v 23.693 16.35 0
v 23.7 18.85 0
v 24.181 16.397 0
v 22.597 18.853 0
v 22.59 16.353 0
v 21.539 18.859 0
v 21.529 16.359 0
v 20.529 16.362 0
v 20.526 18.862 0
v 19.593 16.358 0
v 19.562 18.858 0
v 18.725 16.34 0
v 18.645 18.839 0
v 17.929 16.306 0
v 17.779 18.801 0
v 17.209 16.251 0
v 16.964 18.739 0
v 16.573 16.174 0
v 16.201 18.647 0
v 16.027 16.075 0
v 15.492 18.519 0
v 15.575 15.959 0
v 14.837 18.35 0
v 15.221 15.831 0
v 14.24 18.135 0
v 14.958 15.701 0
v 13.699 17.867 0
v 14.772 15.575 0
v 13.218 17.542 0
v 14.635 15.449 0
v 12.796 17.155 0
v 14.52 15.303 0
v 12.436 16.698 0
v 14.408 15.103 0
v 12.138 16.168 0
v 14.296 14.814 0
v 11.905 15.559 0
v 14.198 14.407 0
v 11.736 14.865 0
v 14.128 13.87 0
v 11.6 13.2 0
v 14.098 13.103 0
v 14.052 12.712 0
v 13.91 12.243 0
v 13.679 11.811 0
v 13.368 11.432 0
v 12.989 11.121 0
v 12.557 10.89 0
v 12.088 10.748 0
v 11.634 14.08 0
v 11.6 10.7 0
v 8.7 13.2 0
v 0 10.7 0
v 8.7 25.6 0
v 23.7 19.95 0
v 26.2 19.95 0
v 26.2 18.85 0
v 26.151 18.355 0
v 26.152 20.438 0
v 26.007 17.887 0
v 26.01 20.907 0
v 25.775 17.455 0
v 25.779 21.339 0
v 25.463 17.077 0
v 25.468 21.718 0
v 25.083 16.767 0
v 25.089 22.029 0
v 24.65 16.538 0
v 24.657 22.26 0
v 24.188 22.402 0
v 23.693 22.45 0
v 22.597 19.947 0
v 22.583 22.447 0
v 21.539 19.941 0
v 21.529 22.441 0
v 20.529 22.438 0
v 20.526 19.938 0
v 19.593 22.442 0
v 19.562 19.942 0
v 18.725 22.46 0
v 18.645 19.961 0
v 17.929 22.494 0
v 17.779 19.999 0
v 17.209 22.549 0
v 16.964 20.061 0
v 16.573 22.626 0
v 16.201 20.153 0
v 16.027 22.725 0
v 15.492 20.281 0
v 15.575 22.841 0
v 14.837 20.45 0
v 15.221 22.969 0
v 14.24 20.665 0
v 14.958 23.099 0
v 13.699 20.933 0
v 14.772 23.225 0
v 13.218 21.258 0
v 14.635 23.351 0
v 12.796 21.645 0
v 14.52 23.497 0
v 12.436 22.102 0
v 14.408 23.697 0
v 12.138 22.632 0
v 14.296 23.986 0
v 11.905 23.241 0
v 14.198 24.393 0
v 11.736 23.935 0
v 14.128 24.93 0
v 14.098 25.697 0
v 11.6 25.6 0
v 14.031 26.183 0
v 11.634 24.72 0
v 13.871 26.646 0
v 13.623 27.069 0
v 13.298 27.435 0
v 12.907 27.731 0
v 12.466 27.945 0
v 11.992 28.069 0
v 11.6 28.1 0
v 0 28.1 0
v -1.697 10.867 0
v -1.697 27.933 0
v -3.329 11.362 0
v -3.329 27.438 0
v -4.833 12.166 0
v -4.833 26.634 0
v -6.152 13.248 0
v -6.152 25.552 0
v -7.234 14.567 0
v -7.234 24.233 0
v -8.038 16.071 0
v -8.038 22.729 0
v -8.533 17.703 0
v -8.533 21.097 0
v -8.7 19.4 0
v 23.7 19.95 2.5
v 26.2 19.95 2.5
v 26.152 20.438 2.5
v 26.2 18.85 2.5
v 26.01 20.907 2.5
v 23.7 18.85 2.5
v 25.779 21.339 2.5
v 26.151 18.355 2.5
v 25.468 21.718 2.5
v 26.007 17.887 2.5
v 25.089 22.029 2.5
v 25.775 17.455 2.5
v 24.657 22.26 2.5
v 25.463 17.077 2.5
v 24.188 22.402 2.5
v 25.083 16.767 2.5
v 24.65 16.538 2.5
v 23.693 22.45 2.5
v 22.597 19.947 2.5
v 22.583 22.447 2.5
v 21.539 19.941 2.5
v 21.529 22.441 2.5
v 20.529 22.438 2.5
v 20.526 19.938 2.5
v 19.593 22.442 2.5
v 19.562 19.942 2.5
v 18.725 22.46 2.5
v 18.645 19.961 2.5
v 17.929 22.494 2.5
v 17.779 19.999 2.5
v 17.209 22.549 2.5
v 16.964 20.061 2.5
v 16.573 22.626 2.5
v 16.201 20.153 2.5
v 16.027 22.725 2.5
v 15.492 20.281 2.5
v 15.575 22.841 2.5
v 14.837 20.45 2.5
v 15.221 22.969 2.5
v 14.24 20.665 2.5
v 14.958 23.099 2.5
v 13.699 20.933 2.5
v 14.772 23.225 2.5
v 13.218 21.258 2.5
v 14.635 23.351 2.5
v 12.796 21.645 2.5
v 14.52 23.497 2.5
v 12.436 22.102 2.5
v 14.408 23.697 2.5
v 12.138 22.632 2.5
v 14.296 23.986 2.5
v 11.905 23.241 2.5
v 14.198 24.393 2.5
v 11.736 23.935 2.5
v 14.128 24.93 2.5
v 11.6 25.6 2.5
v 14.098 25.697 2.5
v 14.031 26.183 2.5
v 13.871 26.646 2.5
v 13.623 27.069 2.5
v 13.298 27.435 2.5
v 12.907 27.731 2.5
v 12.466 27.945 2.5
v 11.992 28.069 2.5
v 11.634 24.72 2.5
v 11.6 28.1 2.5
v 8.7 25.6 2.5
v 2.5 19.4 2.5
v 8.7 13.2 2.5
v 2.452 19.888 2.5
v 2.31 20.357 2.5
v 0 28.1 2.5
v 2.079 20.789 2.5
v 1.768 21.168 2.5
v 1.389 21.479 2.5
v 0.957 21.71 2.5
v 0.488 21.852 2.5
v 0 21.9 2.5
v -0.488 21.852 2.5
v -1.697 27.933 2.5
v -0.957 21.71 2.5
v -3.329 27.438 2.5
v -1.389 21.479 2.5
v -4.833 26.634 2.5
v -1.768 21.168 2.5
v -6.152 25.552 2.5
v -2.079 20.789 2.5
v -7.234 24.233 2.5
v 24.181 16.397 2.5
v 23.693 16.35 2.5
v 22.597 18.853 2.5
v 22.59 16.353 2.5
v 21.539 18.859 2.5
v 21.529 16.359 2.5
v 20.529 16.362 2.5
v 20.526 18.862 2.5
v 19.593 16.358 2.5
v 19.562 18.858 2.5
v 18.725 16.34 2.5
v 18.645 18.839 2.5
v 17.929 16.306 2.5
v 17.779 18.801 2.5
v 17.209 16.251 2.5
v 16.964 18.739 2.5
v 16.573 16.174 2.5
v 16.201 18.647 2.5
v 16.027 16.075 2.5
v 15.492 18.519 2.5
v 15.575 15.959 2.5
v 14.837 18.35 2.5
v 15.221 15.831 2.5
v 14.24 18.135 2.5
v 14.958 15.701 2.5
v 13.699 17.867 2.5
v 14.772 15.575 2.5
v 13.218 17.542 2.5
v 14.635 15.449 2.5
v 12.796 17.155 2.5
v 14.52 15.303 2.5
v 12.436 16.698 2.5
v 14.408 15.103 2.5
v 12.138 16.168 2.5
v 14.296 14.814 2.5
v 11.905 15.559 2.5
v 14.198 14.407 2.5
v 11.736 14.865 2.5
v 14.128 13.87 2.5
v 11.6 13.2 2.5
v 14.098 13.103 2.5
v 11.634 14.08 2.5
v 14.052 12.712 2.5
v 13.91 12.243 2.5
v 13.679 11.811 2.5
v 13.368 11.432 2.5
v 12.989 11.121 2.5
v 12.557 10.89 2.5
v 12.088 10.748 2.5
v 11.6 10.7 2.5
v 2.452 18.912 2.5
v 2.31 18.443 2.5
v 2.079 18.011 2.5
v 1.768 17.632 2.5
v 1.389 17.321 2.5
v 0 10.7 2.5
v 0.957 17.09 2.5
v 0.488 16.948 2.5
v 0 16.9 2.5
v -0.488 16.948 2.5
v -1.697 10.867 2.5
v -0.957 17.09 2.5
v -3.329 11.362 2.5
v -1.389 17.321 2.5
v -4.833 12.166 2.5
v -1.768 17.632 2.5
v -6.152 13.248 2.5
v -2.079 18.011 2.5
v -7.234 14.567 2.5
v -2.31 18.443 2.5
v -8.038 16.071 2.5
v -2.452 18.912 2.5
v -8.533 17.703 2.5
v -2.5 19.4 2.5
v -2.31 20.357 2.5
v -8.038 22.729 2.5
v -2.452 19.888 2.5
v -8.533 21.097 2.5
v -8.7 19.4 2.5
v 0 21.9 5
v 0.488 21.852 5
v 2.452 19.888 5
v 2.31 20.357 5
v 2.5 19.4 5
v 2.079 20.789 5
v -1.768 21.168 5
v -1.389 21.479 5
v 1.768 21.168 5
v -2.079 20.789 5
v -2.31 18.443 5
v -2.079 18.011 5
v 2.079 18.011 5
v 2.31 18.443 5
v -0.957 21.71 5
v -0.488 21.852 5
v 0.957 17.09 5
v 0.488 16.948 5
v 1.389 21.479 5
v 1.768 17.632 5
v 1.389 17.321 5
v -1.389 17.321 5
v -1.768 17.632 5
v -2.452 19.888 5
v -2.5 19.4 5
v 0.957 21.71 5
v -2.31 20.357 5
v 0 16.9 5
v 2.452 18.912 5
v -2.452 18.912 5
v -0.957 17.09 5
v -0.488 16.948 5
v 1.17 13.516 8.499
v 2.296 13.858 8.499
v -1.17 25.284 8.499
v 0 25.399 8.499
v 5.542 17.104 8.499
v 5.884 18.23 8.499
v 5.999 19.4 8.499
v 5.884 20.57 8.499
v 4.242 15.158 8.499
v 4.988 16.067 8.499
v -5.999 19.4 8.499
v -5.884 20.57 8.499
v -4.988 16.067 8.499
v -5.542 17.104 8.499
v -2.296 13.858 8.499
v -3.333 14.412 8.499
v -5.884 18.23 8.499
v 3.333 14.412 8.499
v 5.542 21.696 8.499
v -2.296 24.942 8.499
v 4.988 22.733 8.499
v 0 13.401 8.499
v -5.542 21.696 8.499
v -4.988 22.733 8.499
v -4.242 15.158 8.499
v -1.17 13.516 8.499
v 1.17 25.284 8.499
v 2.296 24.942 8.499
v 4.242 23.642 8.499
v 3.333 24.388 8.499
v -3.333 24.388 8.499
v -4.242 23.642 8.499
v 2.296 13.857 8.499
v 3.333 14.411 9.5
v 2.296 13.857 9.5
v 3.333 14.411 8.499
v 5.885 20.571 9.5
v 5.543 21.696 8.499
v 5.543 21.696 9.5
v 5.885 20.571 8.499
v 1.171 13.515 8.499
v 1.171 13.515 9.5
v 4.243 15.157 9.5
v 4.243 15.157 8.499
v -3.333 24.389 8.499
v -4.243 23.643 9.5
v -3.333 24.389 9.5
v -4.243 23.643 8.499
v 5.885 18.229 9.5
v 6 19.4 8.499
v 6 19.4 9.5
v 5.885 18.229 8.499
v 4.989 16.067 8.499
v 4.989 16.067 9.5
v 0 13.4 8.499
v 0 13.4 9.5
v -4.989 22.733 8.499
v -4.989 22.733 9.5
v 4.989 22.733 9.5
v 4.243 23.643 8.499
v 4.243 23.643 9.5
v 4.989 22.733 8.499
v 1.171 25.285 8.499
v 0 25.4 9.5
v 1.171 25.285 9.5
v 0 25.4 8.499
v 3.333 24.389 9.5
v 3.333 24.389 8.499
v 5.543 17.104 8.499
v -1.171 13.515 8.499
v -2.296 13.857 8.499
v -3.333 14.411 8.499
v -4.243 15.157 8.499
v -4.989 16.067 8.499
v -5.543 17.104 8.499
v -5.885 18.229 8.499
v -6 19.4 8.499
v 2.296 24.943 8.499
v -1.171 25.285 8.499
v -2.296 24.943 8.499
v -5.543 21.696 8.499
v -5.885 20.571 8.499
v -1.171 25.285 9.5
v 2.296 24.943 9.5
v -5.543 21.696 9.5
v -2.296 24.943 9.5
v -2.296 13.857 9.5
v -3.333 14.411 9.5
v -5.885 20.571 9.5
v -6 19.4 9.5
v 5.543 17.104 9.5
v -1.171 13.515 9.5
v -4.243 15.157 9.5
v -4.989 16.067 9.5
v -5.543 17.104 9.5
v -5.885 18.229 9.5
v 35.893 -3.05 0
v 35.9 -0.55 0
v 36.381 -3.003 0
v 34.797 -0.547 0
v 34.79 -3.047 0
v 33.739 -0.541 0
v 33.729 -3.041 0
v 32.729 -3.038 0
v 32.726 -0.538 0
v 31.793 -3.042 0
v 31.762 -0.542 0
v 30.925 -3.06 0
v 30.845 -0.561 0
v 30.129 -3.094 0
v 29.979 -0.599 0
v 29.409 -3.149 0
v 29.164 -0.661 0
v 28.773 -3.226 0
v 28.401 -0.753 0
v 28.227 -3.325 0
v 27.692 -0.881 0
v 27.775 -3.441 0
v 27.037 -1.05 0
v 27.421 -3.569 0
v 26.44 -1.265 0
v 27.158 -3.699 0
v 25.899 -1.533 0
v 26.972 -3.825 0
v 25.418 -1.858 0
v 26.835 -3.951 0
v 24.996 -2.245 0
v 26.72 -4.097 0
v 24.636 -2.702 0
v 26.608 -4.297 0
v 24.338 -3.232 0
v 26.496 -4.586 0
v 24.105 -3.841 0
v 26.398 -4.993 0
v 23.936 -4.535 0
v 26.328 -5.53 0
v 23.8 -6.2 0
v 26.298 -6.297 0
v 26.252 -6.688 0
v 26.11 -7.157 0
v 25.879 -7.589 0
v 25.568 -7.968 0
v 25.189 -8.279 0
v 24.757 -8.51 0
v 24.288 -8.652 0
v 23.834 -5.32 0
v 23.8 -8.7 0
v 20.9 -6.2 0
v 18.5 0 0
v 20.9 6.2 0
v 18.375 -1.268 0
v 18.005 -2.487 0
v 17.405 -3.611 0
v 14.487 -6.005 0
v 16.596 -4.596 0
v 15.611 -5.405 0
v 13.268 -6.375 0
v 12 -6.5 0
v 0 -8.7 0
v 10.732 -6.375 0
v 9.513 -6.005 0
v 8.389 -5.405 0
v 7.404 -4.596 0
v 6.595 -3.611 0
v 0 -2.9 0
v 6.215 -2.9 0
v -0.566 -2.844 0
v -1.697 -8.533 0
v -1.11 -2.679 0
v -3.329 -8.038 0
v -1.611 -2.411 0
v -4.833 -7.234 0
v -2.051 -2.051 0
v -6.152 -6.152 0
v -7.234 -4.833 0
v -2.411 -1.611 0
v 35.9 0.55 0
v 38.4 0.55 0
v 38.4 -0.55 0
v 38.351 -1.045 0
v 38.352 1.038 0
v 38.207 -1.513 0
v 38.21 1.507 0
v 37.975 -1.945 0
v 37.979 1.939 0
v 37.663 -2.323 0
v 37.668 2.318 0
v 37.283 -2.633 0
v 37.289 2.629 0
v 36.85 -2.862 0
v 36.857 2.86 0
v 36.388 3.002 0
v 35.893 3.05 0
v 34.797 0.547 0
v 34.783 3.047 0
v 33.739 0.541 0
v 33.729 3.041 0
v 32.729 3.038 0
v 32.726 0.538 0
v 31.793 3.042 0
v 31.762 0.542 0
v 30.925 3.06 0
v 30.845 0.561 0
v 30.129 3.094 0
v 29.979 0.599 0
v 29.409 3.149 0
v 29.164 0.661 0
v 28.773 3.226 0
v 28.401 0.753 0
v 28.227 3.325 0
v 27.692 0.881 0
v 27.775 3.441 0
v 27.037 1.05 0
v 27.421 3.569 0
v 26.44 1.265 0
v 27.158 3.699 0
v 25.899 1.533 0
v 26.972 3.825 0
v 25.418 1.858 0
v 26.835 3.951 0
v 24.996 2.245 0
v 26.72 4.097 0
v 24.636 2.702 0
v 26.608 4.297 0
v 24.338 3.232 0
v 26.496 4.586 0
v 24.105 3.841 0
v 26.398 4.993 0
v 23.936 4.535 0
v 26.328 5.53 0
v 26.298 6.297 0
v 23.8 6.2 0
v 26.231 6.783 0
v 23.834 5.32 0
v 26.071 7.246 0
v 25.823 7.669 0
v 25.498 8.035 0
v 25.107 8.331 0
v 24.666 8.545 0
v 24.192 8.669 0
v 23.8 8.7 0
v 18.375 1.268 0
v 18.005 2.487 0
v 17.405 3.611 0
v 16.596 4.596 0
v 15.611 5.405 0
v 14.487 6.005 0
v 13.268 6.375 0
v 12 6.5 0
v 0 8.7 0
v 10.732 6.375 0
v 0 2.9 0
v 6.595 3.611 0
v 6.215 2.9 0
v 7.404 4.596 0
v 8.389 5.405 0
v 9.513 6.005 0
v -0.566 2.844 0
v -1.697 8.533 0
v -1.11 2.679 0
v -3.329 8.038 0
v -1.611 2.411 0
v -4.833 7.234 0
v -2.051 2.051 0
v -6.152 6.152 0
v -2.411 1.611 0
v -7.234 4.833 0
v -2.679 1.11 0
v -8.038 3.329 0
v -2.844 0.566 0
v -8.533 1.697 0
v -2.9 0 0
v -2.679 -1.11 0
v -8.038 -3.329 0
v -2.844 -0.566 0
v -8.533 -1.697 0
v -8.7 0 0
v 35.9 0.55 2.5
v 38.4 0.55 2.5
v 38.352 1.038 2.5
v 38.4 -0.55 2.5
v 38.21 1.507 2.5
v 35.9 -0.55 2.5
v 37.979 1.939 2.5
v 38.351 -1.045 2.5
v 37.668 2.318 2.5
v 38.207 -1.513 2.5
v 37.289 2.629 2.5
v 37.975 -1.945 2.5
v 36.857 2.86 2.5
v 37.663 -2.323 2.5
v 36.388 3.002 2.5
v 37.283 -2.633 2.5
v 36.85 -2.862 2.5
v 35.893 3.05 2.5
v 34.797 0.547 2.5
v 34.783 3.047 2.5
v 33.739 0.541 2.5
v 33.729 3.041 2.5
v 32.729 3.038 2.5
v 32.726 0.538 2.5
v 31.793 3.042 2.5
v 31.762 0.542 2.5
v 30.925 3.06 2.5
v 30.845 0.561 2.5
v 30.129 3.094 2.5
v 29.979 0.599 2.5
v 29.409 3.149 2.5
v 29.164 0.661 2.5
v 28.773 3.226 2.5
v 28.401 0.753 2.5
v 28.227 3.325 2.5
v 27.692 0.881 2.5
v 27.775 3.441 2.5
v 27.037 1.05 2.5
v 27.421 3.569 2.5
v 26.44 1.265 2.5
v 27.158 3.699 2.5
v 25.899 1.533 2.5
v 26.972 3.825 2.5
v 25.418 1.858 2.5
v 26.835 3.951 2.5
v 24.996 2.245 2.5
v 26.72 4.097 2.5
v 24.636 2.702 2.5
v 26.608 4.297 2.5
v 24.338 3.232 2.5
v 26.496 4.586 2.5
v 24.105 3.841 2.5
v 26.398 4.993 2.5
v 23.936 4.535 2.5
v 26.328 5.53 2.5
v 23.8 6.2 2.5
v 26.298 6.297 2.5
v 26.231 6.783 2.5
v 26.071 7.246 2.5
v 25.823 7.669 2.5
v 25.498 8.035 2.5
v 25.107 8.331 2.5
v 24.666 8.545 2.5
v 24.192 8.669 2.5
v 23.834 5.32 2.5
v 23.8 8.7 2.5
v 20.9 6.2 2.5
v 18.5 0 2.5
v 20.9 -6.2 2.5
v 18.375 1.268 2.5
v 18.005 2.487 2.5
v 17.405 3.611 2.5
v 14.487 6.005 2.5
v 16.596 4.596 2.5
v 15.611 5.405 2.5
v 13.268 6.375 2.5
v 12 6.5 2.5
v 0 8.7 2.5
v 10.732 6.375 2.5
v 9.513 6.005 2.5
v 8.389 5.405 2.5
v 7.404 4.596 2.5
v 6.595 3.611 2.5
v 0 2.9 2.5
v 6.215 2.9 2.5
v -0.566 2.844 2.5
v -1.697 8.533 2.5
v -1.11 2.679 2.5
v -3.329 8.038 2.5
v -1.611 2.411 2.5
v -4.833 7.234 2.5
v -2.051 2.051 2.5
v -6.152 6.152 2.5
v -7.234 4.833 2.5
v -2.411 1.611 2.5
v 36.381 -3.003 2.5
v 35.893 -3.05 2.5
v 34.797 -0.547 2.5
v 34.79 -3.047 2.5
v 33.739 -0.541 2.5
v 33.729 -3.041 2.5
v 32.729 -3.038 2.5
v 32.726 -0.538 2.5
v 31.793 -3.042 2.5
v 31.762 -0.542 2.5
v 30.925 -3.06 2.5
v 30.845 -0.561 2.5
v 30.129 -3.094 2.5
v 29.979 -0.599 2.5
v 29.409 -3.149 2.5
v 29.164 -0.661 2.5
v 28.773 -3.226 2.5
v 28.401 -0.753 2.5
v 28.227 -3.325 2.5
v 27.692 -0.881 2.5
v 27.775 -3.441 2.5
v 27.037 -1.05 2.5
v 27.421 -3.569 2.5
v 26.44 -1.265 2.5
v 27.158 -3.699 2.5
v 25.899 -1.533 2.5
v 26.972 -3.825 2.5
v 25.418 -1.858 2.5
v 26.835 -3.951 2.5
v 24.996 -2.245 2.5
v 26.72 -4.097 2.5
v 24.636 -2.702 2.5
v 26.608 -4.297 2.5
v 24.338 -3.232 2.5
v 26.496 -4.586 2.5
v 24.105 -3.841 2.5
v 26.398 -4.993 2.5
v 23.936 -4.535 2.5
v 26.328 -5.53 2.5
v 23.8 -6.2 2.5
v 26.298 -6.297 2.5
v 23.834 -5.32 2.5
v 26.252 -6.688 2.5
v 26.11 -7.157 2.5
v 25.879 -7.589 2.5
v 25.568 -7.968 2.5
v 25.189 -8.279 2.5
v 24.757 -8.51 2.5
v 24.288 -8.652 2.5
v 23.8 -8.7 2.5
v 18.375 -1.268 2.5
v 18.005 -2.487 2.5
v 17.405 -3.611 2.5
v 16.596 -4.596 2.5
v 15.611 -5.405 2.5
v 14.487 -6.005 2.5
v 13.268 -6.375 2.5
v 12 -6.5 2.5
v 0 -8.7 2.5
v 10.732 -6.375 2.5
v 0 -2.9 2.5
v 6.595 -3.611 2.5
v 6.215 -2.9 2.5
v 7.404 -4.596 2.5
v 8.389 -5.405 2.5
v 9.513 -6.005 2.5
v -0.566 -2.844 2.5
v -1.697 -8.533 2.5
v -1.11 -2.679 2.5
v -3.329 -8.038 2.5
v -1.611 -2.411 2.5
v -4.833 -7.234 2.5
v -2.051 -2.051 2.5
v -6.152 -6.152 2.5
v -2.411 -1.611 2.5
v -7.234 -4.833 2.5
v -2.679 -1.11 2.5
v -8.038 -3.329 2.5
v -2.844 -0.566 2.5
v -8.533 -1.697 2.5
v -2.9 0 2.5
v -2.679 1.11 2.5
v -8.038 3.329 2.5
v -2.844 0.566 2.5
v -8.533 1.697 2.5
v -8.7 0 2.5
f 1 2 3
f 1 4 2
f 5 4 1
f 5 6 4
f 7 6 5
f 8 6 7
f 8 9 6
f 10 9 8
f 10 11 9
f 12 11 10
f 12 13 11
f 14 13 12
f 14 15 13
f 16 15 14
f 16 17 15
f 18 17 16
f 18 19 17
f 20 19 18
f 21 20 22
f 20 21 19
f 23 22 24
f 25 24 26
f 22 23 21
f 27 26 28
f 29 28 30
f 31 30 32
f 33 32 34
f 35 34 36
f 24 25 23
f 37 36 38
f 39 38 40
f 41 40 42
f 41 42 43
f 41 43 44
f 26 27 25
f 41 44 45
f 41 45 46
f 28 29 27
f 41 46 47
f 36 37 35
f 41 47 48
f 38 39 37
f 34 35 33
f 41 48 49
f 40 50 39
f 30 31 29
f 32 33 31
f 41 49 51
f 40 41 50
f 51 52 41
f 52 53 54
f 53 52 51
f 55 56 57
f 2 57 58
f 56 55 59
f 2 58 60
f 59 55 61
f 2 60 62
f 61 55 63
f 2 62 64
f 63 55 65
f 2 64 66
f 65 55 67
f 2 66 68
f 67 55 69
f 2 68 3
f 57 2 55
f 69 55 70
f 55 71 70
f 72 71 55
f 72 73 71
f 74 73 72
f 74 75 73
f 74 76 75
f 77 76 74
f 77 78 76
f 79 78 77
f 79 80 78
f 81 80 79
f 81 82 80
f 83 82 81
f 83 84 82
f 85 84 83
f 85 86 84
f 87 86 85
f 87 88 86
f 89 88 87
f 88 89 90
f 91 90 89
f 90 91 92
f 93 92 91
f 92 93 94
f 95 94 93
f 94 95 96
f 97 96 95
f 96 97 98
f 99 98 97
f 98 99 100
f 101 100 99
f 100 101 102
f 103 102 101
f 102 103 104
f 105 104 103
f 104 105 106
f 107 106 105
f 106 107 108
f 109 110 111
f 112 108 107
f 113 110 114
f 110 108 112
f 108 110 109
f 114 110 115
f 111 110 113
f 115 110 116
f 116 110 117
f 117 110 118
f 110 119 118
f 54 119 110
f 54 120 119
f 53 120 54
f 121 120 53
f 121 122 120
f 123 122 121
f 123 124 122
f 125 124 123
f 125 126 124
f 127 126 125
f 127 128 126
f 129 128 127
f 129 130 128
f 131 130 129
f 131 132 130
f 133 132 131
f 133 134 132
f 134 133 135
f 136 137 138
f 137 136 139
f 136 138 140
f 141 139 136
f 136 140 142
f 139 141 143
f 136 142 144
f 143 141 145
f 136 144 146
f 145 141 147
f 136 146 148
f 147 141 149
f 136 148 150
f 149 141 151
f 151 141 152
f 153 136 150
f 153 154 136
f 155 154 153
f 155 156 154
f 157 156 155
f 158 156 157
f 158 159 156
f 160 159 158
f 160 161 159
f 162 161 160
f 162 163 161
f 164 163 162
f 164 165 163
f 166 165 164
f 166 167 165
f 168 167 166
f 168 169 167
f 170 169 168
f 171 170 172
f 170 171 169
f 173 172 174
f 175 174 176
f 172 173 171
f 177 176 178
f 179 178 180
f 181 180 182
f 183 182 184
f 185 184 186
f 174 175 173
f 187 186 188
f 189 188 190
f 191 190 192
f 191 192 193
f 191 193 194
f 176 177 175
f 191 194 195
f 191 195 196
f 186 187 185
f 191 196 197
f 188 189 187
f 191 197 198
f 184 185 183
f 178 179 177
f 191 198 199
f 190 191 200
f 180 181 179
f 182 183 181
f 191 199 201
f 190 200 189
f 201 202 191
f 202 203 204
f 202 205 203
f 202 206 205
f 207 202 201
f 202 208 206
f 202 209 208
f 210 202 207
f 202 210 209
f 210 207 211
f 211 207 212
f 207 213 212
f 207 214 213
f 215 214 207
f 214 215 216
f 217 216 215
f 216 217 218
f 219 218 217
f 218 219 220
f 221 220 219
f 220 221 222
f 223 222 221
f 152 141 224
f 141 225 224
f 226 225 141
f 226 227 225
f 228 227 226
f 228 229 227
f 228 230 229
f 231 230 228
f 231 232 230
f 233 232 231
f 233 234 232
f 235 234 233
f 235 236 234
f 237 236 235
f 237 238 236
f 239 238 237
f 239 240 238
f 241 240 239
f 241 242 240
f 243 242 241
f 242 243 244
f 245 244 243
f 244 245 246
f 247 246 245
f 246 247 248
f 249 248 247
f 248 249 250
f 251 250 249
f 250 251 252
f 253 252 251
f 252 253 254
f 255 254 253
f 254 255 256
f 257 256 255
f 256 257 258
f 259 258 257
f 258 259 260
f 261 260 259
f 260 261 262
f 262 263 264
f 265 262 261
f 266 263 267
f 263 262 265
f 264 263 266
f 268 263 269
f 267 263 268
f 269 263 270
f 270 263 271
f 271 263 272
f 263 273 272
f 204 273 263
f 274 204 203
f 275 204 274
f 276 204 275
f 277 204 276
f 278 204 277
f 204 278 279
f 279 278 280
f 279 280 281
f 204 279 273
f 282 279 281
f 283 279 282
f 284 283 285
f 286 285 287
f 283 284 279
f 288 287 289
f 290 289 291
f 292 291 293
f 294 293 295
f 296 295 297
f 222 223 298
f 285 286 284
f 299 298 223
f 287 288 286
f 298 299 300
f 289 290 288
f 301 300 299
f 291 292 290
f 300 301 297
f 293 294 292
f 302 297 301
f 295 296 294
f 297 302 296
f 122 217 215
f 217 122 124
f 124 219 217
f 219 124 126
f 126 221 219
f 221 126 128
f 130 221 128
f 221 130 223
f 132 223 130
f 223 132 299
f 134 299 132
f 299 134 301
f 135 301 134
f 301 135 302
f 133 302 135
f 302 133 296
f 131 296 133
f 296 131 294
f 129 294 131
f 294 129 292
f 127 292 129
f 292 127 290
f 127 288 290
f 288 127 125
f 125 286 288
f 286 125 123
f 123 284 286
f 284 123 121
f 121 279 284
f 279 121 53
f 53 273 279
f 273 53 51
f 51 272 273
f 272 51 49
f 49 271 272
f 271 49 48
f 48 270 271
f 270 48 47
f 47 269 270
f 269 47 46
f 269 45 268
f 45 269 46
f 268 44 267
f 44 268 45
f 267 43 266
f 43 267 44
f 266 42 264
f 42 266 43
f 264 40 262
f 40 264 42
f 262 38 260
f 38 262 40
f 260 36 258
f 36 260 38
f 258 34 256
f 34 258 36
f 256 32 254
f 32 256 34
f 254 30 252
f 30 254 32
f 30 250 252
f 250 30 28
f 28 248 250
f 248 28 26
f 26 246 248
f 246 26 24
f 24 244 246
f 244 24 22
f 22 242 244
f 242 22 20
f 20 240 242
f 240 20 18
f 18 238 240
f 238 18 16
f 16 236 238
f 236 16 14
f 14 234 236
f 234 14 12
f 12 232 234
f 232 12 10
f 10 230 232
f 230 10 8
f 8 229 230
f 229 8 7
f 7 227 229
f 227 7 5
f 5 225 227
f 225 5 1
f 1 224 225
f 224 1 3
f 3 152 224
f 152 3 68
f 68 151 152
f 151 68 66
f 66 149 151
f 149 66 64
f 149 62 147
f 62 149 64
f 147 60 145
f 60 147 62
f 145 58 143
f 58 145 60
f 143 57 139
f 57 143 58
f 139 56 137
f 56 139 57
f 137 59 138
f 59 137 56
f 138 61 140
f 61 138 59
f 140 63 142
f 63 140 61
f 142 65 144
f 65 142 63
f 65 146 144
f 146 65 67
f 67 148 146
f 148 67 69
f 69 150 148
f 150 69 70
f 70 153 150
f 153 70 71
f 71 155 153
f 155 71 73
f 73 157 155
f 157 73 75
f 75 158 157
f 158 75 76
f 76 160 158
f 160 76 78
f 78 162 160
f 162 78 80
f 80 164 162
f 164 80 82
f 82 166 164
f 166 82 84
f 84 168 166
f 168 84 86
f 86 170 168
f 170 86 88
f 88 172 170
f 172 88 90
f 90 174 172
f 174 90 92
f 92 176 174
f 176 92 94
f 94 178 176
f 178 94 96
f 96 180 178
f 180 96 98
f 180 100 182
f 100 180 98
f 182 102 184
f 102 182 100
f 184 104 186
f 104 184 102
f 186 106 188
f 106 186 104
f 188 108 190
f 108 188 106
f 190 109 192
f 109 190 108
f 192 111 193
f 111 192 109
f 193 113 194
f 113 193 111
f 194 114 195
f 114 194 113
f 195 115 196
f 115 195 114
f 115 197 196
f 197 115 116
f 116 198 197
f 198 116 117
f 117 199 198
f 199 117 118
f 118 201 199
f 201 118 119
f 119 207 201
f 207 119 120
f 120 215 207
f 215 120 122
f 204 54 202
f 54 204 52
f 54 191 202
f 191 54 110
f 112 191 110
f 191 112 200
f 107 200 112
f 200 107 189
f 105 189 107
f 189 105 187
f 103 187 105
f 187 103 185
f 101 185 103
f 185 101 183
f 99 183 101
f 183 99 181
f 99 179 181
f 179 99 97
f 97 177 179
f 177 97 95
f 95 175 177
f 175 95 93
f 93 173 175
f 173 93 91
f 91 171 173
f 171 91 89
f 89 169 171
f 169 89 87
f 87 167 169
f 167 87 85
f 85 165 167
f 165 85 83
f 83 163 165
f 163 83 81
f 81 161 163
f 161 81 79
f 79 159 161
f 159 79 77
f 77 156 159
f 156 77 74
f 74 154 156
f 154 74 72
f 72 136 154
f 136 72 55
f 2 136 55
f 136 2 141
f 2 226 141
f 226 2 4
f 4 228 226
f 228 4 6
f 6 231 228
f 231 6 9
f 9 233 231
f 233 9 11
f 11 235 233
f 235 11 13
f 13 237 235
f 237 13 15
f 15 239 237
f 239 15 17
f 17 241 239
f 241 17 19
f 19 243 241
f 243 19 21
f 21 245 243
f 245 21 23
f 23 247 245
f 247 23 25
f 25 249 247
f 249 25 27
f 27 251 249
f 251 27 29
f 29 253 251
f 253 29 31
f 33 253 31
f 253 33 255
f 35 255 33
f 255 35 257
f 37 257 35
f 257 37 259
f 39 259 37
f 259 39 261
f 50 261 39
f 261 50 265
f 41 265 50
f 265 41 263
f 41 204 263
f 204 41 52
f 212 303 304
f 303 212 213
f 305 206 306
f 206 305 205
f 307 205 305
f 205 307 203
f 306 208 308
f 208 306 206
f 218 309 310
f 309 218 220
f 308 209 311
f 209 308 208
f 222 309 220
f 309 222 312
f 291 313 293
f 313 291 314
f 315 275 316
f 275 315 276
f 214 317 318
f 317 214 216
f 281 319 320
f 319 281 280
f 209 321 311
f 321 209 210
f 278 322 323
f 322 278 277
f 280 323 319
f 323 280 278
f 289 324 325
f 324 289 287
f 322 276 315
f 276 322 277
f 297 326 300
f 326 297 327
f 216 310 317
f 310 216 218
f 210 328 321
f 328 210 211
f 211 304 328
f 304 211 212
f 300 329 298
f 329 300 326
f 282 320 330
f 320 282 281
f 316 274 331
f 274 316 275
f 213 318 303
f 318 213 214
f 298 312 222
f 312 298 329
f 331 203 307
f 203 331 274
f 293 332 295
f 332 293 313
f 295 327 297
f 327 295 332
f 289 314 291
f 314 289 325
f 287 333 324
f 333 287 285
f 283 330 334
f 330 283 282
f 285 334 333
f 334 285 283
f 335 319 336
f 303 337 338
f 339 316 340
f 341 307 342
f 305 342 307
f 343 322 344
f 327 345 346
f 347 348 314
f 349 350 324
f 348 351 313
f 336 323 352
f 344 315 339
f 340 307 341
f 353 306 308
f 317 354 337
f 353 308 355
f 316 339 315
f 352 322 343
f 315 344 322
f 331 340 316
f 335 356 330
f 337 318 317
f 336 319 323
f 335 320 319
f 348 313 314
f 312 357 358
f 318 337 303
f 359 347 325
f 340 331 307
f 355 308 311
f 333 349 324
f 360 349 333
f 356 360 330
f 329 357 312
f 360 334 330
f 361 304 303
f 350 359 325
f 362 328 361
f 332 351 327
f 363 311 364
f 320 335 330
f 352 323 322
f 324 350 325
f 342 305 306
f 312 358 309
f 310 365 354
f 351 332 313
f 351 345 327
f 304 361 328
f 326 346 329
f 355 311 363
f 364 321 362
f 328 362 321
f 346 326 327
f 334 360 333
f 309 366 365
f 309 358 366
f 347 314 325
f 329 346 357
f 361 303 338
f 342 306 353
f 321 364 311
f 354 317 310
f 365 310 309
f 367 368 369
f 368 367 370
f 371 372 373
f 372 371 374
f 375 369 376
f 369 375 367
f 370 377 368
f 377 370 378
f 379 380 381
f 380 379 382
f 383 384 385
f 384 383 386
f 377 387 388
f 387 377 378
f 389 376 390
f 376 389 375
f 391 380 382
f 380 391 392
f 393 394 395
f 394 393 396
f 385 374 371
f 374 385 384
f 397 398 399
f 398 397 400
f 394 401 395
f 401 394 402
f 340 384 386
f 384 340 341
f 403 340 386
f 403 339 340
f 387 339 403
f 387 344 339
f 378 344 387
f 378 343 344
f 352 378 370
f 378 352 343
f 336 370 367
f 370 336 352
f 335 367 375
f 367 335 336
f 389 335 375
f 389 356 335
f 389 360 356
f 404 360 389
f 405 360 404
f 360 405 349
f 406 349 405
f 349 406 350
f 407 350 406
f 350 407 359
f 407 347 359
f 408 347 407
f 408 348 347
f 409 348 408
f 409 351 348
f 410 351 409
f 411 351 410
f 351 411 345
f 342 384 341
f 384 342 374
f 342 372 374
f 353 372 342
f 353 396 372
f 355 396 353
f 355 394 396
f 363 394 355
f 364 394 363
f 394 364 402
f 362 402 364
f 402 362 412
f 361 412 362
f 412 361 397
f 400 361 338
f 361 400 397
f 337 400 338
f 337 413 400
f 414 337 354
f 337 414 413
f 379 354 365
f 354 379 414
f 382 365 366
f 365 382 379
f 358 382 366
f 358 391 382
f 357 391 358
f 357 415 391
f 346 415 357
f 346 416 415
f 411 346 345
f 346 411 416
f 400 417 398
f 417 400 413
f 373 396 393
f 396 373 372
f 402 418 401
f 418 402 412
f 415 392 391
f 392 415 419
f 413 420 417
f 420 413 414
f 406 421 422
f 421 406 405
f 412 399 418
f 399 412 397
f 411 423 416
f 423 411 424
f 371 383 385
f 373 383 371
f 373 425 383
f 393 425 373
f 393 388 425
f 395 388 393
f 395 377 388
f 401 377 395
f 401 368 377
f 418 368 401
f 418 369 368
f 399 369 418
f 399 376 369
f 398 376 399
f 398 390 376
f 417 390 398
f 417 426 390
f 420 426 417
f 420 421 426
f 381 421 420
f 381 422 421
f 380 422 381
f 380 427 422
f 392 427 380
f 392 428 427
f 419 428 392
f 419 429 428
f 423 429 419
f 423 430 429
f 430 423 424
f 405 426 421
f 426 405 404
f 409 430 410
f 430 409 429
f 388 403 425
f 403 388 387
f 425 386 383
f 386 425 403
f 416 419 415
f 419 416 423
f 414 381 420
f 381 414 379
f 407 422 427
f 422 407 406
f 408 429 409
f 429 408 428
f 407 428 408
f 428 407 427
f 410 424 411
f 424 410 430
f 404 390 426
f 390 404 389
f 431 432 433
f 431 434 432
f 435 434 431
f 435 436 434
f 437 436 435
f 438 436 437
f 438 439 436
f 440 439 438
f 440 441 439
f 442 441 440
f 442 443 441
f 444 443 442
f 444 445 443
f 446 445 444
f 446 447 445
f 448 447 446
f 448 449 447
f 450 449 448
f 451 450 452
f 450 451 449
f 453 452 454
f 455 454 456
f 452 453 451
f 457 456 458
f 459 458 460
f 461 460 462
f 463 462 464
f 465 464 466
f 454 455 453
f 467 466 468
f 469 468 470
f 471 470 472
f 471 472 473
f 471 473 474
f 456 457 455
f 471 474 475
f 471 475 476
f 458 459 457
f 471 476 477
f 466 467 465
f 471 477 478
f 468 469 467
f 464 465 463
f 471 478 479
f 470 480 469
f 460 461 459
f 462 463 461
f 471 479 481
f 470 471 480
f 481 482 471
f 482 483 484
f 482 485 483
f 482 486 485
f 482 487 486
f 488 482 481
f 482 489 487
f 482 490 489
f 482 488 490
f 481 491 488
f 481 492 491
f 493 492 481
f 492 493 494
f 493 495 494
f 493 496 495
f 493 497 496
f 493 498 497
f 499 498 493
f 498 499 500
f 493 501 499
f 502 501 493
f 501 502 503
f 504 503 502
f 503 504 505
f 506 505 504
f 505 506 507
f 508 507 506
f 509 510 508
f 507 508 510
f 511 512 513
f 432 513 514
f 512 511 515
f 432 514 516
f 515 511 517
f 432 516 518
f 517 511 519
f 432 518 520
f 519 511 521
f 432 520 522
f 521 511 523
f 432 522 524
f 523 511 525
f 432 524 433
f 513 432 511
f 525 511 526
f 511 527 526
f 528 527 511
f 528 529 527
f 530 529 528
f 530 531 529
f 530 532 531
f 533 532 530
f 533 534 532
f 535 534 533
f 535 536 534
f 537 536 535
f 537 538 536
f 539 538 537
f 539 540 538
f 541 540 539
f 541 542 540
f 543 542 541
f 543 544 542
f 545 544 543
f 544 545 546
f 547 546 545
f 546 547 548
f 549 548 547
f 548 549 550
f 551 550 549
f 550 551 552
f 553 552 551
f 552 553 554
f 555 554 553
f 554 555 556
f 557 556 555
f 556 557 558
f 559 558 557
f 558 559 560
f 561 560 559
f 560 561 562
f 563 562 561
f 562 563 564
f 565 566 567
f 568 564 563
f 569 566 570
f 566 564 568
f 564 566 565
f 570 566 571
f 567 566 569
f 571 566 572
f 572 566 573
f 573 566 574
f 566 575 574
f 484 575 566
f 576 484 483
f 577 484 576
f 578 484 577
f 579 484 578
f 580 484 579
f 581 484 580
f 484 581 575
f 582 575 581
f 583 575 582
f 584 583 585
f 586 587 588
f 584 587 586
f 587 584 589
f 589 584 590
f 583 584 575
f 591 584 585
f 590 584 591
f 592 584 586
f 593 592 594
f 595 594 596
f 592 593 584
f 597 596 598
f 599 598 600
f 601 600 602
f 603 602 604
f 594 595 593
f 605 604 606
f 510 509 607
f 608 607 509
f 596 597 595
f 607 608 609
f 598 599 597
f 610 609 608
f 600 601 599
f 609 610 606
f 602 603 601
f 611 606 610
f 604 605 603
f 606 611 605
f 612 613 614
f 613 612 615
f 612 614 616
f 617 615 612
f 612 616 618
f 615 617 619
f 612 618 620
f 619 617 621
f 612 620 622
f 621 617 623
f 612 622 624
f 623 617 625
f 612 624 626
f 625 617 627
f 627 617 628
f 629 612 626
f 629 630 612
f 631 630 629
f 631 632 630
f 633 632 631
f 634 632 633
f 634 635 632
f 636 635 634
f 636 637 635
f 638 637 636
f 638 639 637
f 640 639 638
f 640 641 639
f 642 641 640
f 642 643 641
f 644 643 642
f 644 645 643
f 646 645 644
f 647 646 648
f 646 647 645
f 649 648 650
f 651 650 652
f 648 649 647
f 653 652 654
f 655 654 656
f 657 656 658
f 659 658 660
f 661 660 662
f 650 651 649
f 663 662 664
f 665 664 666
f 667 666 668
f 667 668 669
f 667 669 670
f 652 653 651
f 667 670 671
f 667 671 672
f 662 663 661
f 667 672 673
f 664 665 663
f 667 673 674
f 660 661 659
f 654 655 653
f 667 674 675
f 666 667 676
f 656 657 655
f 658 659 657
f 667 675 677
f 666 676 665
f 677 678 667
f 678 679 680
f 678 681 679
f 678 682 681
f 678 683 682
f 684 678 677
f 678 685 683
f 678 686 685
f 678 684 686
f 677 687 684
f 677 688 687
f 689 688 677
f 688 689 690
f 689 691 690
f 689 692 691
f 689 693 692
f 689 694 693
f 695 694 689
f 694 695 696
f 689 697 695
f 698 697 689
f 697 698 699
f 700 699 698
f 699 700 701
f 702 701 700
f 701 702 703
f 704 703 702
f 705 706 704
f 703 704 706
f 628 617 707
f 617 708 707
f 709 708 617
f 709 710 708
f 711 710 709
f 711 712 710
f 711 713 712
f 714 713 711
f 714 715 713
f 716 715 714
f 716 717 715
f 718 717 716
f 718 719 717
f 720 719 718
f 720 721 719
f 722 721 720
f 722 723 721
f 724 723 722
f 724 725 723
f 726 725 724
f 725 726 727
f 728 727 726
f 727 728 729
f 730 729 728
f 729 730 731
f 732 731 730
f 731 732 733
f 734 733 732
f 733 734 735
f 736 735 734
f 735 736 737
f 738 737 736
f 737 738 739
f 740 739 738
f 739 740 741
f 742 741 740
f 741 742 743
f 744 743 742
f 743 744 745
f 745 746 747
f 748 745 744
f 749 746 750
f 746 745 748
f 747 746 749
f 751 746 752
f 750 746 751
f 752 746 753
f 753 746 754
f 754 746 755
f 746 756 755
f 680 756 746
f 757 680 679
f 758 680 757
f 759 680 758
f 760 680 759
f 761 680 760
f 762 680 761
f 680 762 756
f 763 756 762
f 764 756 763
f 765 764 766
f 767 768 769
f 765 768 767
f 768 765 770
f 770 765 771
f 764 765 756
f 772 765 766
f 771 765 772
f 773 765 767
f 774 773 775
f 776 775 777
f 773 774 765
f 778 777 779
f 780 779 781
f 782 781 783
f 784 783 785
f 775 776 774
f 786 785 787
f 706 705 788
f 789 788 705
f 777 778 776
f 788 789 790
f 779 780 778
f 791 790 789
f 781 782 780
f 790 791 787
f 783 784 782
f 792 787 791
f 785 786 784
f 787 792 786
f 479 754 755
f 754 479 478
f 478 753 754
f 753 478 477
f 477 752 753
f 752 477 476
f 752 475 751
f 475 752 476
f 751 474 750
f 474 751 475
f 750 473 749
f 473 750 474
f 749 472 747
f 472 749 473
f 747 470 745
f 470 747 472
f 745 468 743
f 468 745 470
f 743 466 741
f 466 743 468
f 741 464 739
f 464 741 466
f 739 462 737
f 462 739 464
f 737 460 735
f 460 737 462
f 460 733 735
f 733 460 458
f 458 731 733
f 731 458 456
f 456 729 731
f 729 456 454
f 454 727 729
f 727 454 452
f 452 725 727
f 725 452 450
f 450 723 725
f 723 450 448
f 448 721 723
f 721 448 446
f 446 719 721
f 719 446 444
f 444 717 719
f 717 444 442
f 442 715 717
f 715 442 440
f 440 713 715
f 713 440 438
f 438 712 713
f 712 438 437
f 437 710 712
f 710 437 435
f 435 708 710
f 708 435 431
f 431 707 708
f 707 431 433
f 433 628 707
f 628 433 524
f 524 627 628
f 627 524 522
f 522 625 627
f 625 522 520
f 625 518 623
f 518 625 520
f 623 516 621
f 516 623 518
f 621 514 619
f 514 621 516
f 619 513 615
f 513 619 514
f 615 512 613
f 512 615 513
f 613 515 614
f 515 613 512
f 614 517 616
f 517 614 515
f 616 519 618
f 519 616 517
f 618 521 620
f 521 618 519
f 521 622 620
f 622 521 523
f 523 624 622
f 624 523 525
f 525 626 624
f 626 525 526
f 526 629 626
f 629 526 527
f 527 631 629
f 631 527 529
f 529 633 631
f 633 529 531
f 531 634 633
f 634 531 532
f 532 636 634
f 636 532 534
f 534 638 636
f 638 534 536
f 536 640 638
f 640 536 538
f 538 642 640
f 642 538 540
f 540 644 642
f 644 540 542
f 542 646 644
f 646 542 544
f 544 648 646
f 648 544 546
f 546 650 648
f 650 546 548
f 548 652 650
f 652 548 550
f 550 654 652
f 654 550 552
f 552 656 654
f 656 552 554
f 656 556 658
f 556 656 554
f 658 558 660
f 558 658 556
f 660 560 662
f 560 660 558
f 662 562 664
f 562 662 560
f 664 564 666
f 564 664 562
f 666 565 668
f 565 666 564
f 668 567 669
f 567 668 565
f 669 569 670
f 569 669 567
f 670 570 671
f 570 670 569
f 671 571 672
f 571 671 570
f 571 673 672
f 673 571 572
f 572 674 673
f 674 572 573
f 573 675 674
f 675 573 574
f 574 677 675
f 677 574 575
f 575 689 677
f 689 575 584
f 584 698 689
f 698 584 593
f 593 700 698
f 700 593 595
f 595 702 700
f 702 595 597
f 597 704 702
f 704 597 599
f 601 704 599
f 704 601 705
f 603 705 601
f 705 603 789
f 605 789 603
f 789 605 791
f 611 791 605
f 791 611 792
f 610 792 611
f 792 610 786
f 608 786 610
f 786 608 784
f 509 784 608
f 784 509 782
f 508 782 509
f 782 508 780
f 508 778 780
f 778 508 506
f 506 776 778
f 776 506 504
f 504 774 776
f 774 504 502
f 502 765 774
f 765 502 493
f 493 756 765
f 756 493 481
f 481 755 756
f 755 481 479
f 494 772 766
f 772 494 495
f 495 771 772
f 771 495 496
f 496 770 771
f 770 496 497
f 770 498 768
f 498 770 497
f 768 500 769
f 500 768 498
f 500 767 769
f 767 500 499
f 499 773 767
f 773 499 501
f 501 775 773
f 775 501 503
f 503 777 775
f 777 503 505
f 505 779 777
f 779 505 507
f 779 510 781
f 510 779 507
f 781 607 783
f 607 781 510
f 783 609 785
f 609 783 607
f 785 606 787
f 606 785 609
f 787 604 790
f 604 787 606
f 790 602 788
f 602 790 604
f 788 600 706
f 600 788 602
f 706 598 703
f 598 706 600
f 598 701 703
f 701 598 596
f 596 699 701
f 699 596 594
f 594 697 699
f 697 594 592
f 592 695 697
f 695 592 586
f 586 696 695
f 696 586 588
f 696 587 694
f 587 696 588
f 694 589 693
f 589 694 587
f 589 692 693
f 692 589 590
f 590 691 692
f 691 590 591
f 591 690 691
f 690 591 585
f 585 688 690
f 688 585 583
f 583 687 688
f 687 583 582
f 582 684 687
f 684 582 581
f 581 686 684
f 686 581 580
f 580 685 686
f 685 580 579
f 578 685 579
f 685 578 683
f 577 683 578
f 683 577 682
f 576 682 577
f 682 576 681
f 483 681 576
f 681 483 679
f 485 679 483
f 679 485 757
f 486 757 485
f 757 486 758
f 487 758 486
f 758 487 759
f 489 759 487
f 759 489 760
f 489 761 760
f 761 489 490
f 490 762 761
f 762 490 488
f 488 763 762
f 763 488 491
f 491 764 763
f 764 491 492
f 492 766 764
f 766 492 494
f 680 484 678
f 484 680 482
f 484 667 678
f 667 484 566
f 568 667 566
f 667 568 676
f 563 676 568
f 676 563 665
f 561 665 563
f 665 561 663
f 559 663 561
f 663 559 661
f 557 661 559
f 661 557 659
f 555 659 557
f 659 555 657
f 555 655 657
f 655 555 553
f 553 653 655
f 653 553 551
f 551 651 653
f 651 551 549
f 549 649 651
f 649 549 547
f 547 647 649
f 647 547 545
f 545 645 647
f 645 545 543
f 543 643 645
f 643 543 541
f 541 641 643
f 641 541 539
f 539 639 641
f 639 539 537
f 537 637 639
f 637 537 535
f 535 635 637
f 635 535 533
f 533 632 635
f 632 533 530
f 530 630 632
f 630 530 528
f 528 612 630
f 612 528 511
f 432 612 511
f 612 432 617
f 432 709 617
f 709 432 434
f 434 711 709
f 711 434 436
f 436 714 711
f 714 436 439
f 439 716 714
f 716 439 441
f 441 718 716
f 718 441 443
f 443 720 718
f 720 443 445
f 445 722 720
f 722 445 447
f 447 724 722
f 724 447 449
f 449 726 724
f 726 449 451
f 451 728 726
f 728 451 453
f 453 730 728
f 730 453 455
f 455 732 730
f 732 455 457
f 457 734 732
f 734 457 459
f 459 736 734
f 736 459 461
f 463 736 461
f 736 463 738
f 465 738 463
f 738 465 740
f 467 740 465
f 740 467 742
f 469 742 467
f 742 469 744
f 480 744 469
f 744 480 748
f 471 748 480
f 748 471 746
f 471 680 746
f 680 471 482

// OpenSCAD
// This file was processed by resolve-include.py [https://github.com/arpruss/miscellaneous-scad/blob/master/scripts/resolve-include.py] 
// to include  all the dependencies inside one file.

parts = 0; // 0:all, 1:female, 2:male
cleatWidth = 12.4;
cleatLength = 15;
cleatMinWidth = 1.1;
cleatHead = 2.9;
bezel = 2.5;
tolerance = 0.4;
headTolerance = 0.5;
neckDiameter = 5;
headDiameter = 12;
headHeight = 1;
thickness = 2.5;
slide = 12;

module end_of_parameters_dummy() {}


//BEGIN DEPENDENCY: use <Bezier.scad>;
/*
Copyright (c) 2017 Alexander R. Pruss.

Licensed under any Creative Commons Attribution license you like or under the
following MIT License.

Permission is hereby granted, free of charge, to any person obtaining a copy
of this software and associated documentation files (the "Software"), to deal
in the Software without restriction, including without limitation the rights
to use, copy, modify, merge, publish, distribute, sublicense, and/or sell
copies of the Software, and to permit persons to whom the Software is
furnished to do so, subject to the following conditions:

The above copyright notice and this permission notice shall be included in all
copies or substantial portions of the Software.

THE SOFTWARE IS PROVIDED "AS IS", WITHOUT WARRANTY OF ANY KIND, EXPRESS OR
IMPLIED, INCLUDING BUT NOT LIMITED TO THE WARRANTIES OF MERCHANTABILITY,
FITNESS FOR A PARTICULAR PURPOSE AND NONINFRINGEMENT. IN NO EVENT SHALL THE
AUTHORS OR COPYRIGHT HOLDERS BE LIABLE FOR ANY CLAIM, DAMAGES OR OTHER
LIABILITY, WHETHER IN AN ACTION OF CONTRACT, TORT OR OTHERWISE, ARISING FROM,
OUT OF OR IN CONNECTION WITH THE SOFTWARE OR THE USE OR OTHER DEALINGS IN THE
SOFTWARE.

*/


// Public domain Bezier stuff from www.thingiverse.com/thing:8443
function BEZ03(u) = pow(1-u, 3);
function BEZ13(u) = 3*u*pow(1-u,2);
function BEZ23(u) = 3*pow(u,2)*(1-u);
function BEZ33(u) = pow(u,3);
function PointAlongBez4(p0, p1, p2, p3, u) =
	BEZ03(u)*p0+BEZ13(u)*p1+BEZ23(u)*p2+BEZ33(u)*p3;
// End public domain Bezier stuff
function d2BEZ03(u) = 6*(1-u);
function d2BEZ13(u) = 18*u-12;
function d2BEZ23(u) = -18*u+6;
function d2BEZ33(u) = 6*u;

function worstCase2ndDerivative(p0, p1, p2, p3, u1, u2)
    = norm([
        for(i=[0:len(p0)-1])
            max([for(u=[u1,u2])
                d2BEZ03(u)*p0[i]+d2BEZ13(u)*p1[i]+
                d2BEZ23(u)*p2[i]+d2BEZ33(u)*p3[i]]) ]);

function neededIntervalLength(p0,p1,p2,p3,u1,u2,tolerance)
    = let(d2=worstCase2ndDerivative(p0,p1,p2,p3,u1,u2))
        d2==0 ? u2-u1+1 : sqrt(2*tolerance/d2);

function REPEAT_MIRRORED(v,angleStart=0,angleEnd=360) = ["m",v,angleStart,angleEnd];
function SMOOTH_REL(x) = ["r",x];
function SMOOTH_ABS(x) = ["a",x];
function SYMMETRIC() = ["r",1];
function OFFSET(v) = ["o",v];
function SHARP() = OFFSET([0,0,0]);
function LINE() = ["l",0];
function POLAR(r,angle) = OFFSET(r*[cos(angle),sin(angle)]);
//function POINT_IS_SPECIAL(v) = (v[0]=="r" || v[0]=="a" || v[0]=="o" || v[0]=="l");

// this does NOT handle offset type points; to handle those, use DecodeBezierOffsets()
function getControlPoint(cp,node,otherCP,otherNode,nextNode) =
    let(v=node-otherCP) (
    cp[0]=="r" ? node+cp[1]*v:
    cp[0]=="a" ? (
        norm(v)<1e-9 ? node+cp[1]*(node-otherNode)/norm(node-otherNode) : node+cp[1]*v/norm(v) ) :
        cp );

function onLine2(a,b,c,eps=1e-4) =
    norm(c-a) <= eps ? true
        : norm(b-a) <= eps ? false /* to be safe */
            : abs((c[1]-a[1])*(b[0]-a[0]) - (b[1]-a[1])*(c[0]-a[0])) <= eps * eps && norm(c-a) <= eps + norm(b-a);

function isStraight2(p1,c1,c2,p2,eps=1e-4) =
    len(p1) == 2 &&
    onLine2(p1,p2,c1,eps=eps) && onLine2(p2,p1,c2,eps=eps);

function Bezier2(p,index=0,precision=0.05,rightEndPoint=true,optimize=true) = let(nPoints=
        max(1, precision < 0 ?
                    ceil(1/
                        neededIntervalLength(p[index],p[index+1],p[index+2],p[index+3],0,1,-precision))
                    : ceil(1/precision)) )
    optimize && isStraight2(p[index],p[index+1],p[index+2],p[index+3]) ? (rightEndPoint?[p[index+0],p[index+3]]:[p[index+0]] ) :
    [for (i=[0:nPoints-(rightEndPoint?0:1)]) PointAlongBez4(p[index+0],p[index+1],p[index+2],p[index+3],i/nPoints)];

function flatten(listOfLists) = [ for(list = listOfLists) for(item = list) item ];


// p is a list of points, in the format:
// [node1,control1,control2,node2,control3, control4,node3, ...]
// You can replace inner control points with:
//   SYMMETRIC: uses a reflection of the control point on the other side of the node
//   SMOOTH_REL(x): like SYMMETRIC, but the distance of the control point to the node is x times the distance of the other control point to the node
//   SMOOTH_ABS(x): like SYMMETRIC, but the distance of the control point to the node is exactly x
// You can also replace any control point with:
//   OFFSET(v): puts the control point at the corresponding node plus the vector v
//   SHARP(): equivalent to OFFSET([0,0])
//   LINE(): when used for both control points between two nodes, generates a straight line
//   POLAR(r,angle): like OFFSET, except the offset is specified in polar coordinates

function DecodeBezierOffset(control,node) = control[0] == "o" ? node+control[1] : control;

function _mirrorMatrix(normalVector) = let(v = normalVector/norm(normalVector)) len(v)<3 ? [[1-2*v[0]*v[0],-2*v[0]*v[1]],[-2*v[0]*v[1],1-2*v[1]*v[1]]] : [[1-2*v[0]*v[0],-2*v[0]*v[1],-2*v[0]*v[2]],[-2*v[0]*v[1],1-2*v[1]*v[1],-2*v[1]*v[2]],[-2*v[0]*v[2],-2*v[1]*v[2],1-2*v[2]*v[2]]];

function _correctLength(p,start=0) =
    start >= len(p) || p[start][0] == "m" ? 3*floor(start/3)+1 : _correctLength(p,start=start+1);

function _trimArray(a, n) = [for (i=[0:n-1]) a[i]];

function _transformPoint(matrix,a) =
    let(n=len(a))
        len(matrix[0])==n+1 ?
            _trimArray(matrix * concat(a,[1]), n)
            : matrix * a;

function _transformPath(matrix,path) =
    [for (a=path) _transformPoint(matrix,a)];

function _reverseArray(array) = let(n=len(array)) [for (i=[0:n-1]) array[n-1-i]];

function _stitchPaths(a,b) = let(na=len(a)) [for (i=[0:na+len(b)-2]) i<na? a[i] : b[i-na+1]-b[0]+a[na-1]];

// replace all OFFSET/SHARP/POLAR points with coordinates
function DecodeBezierOffsets(p) = [for (i=[0:_correctLength(p)-1]) i%3==0?p[i]:(i%3==1?DecodeBezierOffset(p[i],p[i-1]):DecodeBezierOffset(p[i],p[i+1]))];

function _mirrorPaths(basePath, control, start) =
    control[start][0] == "m" ? _mirrorPaths(_stitchPaths(basePath,_reverseArray(_transformPath(_mirrorMatrix( control[start][1] ),basePath))), control, start+1) : basePath;

function DecodeMirrored(path,start=0) =
    start >= len(path) ? path :
    path[start][0] == "m" ? _mirrorPaths([for(i=[0:1:start-1]) path[i]], path, start) :
        DecodeMirrored(path,start=start+1);

function DecodeLines(p) = [for (i=[0:len(p)-1])
    i%3==0 || p[i][0] != "l" ? p[i] :
    i%3 == 1 ? (p[i-1]*2+p[i+2])/3 :
    (p[i-2]+p[i+1]*2)/3 ];

function DecodeSpecialBezierPoints(p0) =
    let(
        l = _correctLength(p0),
        doMirror = len(p0)>l && p0[l][0] == "m",
        p1=DecodeLines(p0),
        p=DecodeBezierOffsets(p1),
        basePath = [for (i=[0:l-1]) i%3==0?p[i]:(i%3==1?getControlPoint(p[i],p[i-1],p[i-2],p[i-4],p[i+2]):getControlPoint(p[i],p[i+1],p[i+2],p[i+4],p[i-2]))])
        doMirror ? _mirrorPaths(basePath, p0, l) : basePath;

function Distance2D(a,b) = sqrt((a[0]-b[0])*(a[0]-b[0])+(a[1]-b[1])*(a[1]-b[1]));

function RemoveDuplicates(p,eps=0.00001) = let(safeEps = eps/len(p)) [for (i=[0:len(p)-1]) if(i==0 || i==len(p)-1 || Distance2D(p[i-1],p[i]) >= safeEps) p[i]];

function Bezier(p,precision=0.05,eps=0.00001,optimize=true) = let(q=DecodeSpecialBezierPoints(p), nodes=(len(q)-1)/3) RemoveDuplicates(flatten([for (i=[0:nodes-1]) Bezier2(q,optimize=optimize,index=i*3,precision=precision,rightEndPoint=(i==nodes-1))]),eps=eps);

function GetSplineAngle(a,b,c) =
    a==c && b==a ? 0 :
    a==c ? let(ba=b-a) atan2(ba[1],ba[0]) :
    let(ca=c-a) atan2(ca[1],ca[0]);

/*    let(ba=norm(b-a),cb=norm(c-b))
        ba == 0 && cb == 0 ? 0 :
    let(v = ba == 0 ? c-b :
            cb == 0 ? b-a :
            (c-b)*norm(b-a)/norm(c-b)+(b-a))
    atan2(v[1],v[0]); */

// do a spline around b
function SplineAroundPoint(a,b,c,tension=0.5,includeLeftCP=true,includeRightCP=true) =
    includeLeftCP && includeRightCP ?
        [POLAR(tension*norm(a-b),GetSplineAngle(c,b,a)),b,POLAR(tension*norm(c-b),GetSplineAngle(a,b,c))] :
    includeLeftCP ?
        [POLAR(tension*norm(a-b),GetSplineAngle(c,b,a)),b] :
    includeRightCP ?
        [b,POLAR(tension*norm(c-b),GetSplineAngle(a,b,c))] :
        [b];

function mod(n,m) = let(q=n%m) q>=0 ? q : m+q;

function _unit(v) = norm(v)==0 ? [for(x=v) 0] : v/norm(v);

function _corner(p0,p1,p2,offset=2,tension=0.448084975506) =
    [p1-_unit(p1-p0)*offset,
    p1-_unit(p1-p0)*offset*(1-tension),
    p1-_unit(p1-p2)*offset*(1-tension),
    p1-_unit(p1-p2)*offset,
    LINE(),LINE()];

function _roundPathRaw(path,start,end,offset=2,tension=0.551915024494) =
    let(n=len(path),
        p2=_mirrorPaths(path))
        [for(p=[for(i=[start:1:end-1]) _corner(p2[mod(i-1,n)],p2[i],path[mod(i+1,n)],offset=offset,tension=tension)]) for(q=p) q];

function PathToBezier(path,offset=2,tension=0.551915024494,closed=false) =
    let(p1=DecodeMirrored(path),
        n=len(p1))
        offset==0 && tension==0 ?
        p1 :
        !closed ? concat([p1[0],LINE(),LINE()], _roundPathRaw(p1,1,n-1,offset=offset,tension=tension), [p1[n-1]]) :
        let(p2 = _roundPathRaw(p1,0,n,offset=offset,tension=tension),
            n2 = len(p2))
        [for(i=[0:1:n2-3]) p2[mod(i,n2)]];
function BezierSmoothPoints(points,tension=0.5,closed=false)
    = let (n=len(points))
        flatten(
        closed ? [ for (i=[0:n]) SplineAroundPoint(points[(n+i-1)%n],points[i%n],points[(i+1)%n],tension=tension,includeLeftCP=i>0,includeRightCP=i<n) ] :
        [ for (i=[0:n-1])
            SplineAroundPoint(
            i==0 ? 2*points[0]-points[1] : points[(n+i-1)%n],
            points[i],
            i==n-1 ? 2*points[n-1]-points[n-2] : points[(i+1)%n],tension=tension,includeLeftCP=i>0,includeRightCP=i<n-1  ) ]);

module BezierVisualize(p,precision=0.05,eps=0.00001,lineThickness=0.25,controlLineThickness=0.125,nodeSize=1) {
    $fn = 16;
    dim = len(p[0]);
    module point(size) {
        if (dim==2)
            circle(d=size);
        else
            sphere(d=size);
    }
    p1 = DecodeSpecialBezierPoints(p);
    l = Bezier(p1,precision=precision,eps=eps);
    for (i=[0:len(l)-2]) {
        hull() {
            translate(l[i]) point(lineThickness);
            translate(l[i+1]) point(lineThickness);
        }
    }
    for (i=[0:len(p1)-1]) {
        if (i%3 == 0) {
            color("black") translate(p1[i]) point(nodeSize);
        }
        else {
            node = i%3 == 1 ? i-1 : i+1;
            color("red") translate(p1[i]) point(nodeSize);
            color("red") hull() {
                translate(p1[node]) point(controlLineThickness);
                translate(p1[i]) point(controlLineThickness);
            }
        }
    }
}


//END DEPENDENCY: use <Bezier.scad>;



module dummy(){}

$fn = 32;
nudge = 0.001;

width = cleatWidth + 2*bezel;

module cleat() {
    inside = Bezier([[0,0],LINE(),LINE(),[0,cleatWidth/2],LINE(),LINE(),[cleatHead,cleatWidth/2],POLAR(cleatWidth/2,-90),POLAR(cleatLength/2,180),[cleatLength,cleatMinWidth/2],LINE(),LINE(),[cleatLength,0],REPEAT_MIRRORED([0,1])]);
    difference() {
        offset(r=bezel) polygon(inside);
        polygon(inside);
    }
}

module base(extra=0) {
    translate([width/2+extra,0]) {
        cleat();
        hull() {
            translate([-bezel,-width/2]) square([bezel,width]);
            translate([-width/2-extra,0]) circle(d=width);
        }
    }
}

module male() {
    linear_extrude(height=thickness) base();
    cylinder(d=neckDiameter,h=thickness+headHeight+thickness);

    angled = (headDiameter-neckDiameter)/2;

    translate([0,0,thickness+thickness]) cylinder(d1=neckDiameter,d2=headDiameter,h=angled);
    translate([0,0,thickness+thickness+angled-nudge]) cylinder(d=headDiameter,h=headHeight+nudge);
}

module female() {
    linear_extrude(height=thickness)
    difference() {
        base(extra=slide+neckDiameter/2+tolerance-(width-headDiameter)/2);
        hull() {
            circle(d=neckDiameter+2*tolerance);
            translate([slide,0,0]) circle(d=neckDiameter+2*tolerance);
        }
        translate([slide,0,0]) circle(d=headDiameter+2*headTolerance);
    }
}


if (parts==0 || parts==2)
translate([0,parts==0?width+2:0,0])
male();
if (parts==1 || parts==0)
female();
